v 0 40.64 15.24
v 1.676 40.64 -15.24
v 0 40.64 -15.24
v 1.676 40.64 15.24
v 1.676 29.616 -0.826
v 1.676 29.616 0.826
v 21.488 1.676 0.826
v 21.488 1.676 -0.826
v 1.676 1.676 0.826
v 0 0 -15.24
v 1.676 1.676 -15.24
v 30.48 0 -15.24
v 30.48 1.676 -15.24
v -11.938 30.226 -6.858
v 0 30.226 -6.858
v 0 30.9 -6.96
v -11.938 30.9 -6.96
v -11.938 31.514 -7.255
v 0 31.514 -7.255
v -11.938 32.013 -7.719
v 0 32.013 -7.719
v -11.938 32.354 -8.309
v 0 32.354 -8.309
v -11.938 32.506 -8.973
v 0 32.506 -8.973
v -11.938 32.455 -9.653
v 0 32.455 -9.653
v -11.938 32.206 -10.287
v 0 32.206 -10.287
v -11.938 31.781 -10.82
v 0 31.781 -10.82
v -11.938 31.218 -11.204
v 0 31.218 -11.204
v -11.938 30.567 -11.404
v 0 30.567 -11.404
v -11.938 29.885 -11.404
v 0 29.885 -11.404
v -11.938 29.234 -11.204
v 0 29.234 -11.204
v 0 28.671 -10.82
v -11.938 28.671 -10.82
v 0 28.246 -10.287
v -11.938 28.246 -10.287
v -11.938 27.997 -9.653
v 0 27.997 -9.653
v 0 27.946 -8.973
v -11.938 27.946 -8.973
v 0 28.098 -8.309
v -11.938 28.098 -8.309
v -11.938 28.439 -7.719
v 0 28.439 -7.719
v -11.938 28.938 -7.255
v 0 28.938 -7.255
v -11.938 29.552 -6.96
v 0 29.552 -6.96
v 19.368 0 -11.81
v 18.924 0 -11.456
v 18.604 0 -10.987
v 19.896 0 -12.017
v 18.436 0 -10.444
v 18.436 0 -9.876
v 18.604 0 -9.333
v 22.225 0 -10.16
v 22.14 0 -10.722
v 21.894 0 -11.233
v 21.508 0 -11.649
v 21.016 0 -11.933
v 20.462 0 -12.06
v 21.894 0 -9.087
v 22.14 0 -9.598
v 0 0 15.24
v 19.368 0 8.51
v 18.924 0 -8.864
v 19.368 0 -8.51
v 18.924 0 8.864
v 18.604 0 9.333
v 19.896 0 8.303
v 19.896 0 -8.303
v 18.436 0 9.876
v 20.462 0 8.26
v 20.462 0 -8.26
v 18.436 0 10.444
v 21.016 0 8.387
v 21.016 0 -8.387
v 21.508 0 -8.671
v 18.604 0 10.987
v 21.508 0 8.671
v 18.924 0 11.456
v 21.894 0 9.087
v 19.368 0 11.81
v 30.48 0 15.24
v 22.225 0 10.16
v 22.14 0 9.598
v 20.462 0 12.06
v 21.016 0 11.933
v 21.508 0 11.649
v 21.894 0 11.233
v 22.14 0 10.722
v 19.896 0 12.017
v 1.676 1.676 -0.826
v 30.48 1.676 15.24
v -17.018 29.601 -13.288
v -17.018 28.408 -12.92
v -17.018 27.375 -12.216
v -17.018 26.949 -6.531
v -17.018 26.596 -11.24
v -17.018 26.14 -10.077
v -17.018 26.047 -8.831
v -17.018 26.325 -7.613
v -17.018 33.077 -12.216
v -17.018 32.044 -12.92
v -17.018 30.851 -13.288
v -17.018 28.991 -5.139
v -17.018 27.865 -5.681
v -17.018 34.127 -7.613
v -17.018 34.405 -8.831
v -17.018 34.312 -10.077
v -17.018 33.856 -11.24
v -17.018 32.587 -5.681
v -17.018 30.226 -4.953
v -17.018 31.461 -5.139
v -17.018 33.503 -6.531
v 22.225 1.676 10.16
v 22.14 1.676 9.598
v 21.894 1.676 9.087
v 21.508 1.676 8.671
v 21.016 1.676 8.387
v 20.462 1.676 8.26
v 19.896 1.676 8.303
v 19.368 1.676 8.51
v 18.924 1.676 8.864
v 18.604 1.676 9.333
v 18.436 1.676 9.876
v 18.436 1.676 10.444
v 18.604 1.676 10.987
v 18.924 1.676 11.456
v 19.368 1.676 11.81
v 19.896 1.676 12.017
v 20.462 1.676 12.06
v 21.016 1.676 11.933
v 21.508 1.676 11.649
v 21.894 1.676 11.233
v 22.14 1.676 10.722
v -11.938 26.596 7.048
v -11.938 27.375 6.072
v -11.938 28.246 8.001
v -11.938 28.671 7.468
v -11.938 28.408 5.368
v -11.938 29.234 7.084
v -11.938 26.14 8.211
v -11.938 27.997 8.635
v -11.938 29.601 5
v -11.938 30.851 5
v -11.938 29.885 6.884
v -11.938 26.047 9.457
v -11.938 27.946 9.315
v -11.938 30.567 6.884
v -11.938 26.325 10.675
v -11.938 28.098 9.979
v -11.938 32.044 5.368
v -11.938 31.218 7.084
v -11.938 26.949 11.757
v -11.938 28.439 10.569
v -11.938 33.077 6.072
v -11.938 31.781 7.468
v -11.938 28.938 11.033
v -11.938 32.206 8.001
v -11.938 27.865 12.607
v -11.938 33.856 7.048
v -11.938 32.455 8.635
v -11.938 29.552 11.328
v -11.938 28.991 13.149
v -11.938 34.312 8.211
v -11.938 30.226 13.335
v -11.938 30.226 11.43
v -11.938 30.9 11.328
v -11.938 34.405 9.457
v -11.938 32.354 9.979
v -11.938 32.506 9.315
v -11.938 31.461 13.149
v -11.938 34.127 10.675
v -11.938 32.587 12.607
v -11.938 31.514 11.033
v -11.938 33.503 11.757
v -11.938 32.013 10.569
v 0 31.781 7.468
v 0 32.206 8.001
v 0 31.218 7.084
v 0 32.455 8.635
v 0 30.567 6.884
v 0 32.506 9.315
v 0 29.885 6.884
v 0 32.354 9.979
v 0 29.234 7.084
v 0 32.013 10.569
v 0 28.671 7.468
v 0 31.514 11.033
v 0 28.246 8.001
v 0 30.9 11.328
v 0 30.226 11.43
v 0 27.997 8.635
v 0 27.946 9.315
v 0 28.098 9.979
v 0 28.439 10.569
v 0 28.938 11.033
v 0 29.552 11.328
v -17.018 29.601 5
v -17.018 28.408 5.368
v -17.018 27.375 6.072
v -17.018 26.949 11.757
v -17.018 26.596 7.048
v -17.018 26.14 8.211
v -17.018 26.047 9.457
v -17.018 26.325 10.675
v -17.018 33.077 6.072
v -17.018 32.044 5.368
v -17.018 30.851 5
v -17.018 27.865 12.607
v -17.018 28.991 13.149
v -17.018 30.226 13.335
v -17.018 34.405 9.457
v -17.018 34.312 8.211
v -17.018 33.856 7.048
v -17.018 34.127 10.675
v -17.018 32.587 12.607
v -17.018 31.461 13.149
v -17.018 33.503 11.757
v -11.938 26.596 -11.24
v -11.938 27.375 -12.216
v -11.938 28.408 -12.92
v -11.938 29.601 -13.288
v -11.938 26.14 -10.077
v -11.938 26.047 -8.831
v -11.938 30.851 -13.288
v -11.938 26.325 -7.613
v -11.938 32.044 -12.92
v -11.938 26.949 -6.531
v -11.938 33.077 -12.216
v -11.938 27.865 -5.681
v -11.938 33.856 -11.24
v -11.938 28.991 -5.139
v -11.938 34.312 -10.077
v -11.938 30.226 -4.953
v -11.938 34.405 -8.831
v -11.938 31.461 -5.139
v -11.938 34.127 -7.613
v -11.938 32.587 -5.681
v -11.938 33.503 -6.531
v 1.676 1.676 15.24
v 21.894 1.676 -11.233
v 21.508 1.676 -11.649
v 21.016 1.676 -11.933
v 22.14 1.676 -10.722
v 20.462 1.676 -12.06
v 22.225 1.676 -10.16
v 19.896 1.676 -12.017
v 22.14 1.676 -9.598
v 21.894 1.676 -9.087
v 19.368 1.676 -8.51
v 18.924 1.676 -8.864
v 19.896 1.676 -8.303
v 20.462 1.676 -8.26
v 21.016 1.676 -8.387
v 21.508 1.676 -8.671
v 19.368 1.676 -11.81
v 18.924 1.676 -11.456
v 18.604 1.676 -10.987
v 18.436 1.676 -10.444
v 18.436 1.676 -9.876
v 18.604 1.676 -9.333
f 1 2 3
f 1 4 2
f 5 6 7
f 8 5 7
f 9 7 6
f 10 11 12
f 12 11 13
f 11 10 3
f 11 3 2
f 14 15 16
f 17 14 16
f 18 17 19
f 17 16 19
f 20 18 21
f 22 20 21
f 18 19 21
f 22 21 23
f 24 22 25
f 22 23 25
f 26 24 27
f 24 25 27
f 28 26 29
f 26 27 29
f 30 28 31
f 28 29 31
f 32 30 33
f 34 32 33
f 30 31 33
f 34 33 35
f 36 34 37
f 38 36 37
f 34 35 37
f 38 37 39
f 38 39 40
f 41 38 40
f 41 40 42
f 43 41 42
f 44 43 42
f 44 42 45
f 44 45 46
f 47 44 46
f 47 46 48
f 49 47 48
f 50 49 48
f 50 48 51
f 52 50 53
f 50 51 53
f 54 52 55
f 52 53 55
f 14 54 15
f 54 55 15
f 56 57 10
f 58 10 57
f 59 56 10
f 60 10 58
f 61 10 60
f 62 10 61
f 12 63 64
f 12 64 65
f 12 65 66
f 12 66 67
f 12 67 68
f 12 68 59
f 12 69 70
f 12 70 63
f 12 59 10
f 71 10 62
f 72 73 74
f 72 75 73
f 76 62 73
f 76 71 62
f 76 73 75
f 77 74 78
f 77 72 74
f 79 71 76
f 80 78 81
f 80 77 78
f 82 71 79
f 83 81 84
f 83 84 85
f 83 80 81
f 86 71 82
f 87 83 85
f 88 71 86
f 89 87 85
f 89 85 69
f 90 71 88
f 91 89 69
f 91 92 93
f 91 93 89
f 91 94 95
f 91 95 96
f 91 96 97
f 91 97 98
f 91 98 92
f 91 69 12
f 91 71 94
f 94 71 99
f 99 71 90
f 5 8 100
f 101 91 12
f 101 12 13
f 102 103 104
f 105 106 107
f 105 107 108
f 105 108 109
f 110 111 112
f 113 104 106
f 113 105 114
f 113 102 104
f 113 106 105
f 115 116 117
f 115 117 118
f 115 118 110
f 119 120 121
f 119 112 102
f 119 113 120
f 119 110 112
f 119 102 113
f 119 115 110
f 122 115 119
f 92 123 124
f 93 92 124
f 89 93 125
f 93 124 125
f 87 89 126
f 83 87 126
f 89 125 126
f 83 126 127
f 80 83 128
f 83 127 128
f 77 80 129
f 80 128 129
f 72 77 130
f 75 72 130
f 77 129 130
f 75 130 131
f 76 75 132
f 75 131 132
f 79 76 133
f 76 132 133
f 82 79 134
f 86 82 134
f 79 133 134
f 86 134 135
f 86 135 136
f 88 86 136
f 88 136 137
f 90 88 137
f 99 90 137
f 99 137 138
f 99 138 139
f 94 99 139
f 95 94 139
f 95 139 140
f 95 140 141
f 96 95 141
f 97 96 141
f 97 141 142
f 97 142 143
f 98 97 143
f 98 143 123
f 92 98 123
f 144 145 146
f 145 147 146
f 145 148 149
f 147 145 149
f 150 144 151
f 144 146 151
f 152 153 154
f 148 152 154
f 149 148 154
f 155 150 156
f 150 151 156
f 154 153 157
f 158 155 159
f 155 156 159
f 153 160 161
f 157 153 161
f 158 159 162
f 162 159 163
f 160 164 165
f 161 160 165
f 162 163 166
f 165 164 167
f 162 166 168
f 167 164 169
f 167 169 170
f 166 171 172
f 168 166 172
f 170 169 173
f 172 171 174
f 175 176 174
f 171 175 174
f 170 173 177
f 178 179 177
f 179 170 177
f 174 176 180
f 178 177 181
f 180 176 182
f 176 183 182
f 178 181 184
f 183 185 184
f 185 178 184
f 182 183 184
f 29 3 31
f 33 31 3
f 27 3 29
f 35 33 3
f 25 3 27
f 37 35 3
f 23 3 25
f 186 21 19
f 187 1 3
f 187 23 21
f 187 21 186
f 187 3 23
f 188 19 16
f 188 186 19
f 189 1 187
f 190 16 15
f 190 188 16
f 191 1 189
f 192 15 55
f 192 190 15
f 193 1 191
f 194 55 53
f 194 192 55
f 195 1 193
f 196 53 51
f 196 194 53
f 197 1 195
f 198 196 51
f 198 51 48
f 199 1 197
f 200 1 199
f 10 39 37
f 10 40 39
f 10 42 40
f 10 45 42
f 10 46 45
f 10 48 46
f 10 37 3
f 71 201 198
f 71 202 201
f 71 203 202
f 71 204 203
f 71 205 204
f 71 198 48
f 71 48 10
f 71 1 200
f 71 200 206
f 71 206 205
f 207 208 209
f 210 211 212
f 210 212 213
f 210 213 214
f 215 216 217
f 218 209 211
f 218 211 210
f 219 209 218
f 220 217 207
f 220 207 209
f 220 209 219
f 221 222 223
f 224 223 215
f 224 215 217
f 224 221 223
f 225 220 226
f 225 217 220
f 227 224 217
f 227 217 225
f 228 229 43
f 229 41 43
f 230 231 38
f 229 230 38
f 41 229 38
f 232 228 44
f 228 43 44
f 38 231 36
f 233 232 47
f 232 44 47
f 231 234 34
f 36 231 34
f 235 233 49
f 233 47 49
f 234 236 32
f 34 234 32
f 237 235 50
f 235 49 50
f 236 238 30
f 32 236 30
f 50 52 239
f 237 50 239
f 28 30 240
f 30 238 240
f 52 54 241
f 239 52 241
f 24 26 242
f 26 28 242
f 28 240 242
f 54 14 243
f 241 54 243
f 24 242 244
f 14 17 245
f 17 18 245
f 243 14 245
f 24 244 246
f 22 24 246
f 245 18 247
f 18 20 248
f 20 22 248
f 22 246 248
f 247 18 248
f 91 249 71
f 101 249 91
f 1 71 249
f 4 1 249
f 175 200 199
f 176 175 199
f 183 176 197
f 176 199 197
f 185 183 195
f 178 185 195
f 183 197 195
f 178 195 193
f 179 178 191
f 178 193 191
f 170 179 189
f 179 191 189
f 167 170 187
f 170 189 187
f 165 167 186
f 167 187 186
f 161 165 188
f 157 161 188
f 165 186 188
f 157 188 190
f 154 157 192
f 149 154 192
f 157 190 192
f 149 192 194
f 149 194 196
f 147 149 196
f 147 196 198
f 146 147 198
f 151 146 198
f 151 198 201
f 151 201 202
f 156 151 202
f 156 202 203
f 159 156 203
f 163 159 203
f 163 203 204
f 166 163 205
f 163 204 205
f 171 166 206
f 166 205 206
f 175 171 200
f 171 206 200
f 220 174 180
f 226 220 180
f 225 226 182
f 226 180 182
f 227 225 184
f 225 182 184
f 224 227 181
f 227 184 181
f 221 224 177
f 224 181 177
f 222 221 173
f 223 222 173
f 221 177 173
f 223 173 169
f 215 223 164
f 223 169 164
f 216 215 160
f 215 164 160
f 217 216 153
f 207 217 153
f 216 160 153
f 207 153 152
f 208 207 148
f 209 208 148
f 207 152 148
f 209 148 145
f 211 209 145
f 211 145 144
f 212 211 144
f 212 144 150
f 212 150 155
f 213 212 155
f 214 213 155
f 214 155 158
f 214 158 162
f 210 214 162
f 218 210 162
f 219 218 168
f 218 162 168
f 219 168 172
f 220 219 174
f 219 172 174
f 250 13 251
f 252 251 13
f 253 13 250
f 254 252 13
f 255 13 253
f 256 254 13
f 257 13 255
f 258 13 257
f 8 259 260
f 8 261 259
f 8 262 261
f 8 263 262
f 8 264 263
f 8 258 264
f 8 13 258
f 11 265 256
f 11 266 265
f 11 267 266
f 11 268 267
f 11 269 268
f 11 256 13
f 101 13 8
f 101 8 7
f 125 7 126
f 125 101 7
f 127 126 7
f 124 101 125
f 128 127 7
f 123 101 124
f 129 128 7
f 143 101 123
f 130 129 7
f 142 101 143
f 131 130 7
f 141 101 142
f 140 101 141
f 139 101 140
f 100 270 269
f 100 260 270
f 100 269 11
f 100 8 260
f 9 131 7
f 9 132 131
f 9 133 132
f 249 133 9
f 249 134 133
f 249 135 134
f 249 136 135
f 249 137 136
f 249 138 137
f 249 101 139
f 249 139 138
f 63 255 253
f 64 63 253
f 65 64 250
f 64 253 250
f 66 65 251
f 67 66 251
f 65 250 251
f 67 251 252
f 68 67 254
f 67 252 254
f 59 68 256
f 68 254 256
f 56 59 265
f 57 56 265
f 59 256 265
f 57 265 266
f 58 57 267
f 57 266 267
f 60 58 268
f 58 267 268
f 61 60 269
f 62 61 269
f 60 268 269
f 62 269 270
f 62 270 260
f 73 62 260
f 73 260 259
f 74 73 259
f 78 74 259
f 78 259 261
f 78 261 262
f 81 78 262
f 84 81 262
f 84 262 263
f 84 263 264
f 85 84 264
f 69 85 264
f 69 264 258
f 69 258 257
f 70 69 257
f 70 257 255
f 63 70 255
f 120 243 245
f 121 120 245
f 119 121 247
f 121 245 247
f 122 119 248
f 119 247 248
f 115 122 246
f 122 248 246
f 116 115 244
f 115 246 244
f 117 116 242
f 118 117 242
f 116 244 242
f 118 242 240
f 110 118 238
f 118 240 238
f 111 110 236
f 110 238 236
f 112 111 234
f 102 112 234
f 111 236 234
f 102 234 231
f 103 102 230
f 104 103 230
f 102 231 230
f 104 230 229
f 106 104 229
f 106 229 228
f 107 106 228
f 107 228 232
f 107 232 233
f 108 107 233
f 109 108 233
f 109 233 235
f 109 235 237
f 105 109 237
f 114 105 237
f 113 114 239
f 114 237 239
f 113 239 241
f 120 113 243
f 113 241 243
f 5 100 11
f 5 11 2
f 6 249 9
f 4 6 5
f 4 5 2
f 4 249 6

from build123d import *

# Parameters (mm, degrees)
BOSS_EXTRUDE1_DEPTH = 15.24
BOSS_EXTRUDE2_DEPTH = 0.8255
SKETCH3_R           = 1.905
CUT_EXTRUDE1_DEPTH  = 2.6764
SKETCH5_R           = 2.286
BOSS_EXTRUDE3_DEPTH = 11.938
SKETCH6_R           = 4.191
BOSS_EXTRUDE4_DEPTH = 5.08


with BuildPart() as part:
    # Sketch1 → Boss-Extrude1 (new body, symmetric)
    with BuildSketch(Plane.XY):
        Polygon((0, 0), (30.48, 0), (30.48, 1.6764), (1.6764, 1.6764), (1.6764, 40.64), (0, 40.64), align=None)
    extrude(amount=BOSS_EXTRUDE1_DEPTH, both=True)

    # Sketch2 → Boss-Extrude2 (add, symmetric)
    with BuildSketch(Plane.XY):
        Polygon((1.6764, 29.6164), (21.4884, 1.6764), (1.6764, 1.6764), align=None)
    extrude(amount=BOSS_EXTRUDE2_DEPTH, both=True)

    # Sketch3 → Cut-Extrude1 (cut, through all)
    with BuildSketch(Plane(origin=(0, 1.6764, 0), x_dir=(1, 0, 0), z_dir=(0, 1, 0))):
        with Locations((20.32, 10.16)):
            Circle(SKETCH3_R)
        with Locations((20.32, -10.16)):
            Circle(SKETCH3_R)
    extrude(amount=-CUT_EXTRUDE1_DEPTH, mode=Mode.SUBTRACT)

    # Sketch5 → Boss-Extrude3 (add)
    with BuildSketch(Plane.ZY):
        with Locations((-9.144, 30.226)):
            Circle(SKETCH5_R)
        with Locations((9.144, 30.226)):
            Circle(SKETCH5_R)
    extrude(amount=BOSS_EXTRUDE3_DEPTH)

    # Sketch6 → Boss-Extrude4 (add)
    with BuildSketch(Plane.ZY.offset(11.938)):
        with Locations((-9.144, 30.226)):
            Circle(SKETCH6_R)
        with Locations((9.144, 30.226)):
            Circle(SKETCH6_R)
    extrude(amount=BOSS_EXTRUDE4_DEPTH)


solid = part.part
